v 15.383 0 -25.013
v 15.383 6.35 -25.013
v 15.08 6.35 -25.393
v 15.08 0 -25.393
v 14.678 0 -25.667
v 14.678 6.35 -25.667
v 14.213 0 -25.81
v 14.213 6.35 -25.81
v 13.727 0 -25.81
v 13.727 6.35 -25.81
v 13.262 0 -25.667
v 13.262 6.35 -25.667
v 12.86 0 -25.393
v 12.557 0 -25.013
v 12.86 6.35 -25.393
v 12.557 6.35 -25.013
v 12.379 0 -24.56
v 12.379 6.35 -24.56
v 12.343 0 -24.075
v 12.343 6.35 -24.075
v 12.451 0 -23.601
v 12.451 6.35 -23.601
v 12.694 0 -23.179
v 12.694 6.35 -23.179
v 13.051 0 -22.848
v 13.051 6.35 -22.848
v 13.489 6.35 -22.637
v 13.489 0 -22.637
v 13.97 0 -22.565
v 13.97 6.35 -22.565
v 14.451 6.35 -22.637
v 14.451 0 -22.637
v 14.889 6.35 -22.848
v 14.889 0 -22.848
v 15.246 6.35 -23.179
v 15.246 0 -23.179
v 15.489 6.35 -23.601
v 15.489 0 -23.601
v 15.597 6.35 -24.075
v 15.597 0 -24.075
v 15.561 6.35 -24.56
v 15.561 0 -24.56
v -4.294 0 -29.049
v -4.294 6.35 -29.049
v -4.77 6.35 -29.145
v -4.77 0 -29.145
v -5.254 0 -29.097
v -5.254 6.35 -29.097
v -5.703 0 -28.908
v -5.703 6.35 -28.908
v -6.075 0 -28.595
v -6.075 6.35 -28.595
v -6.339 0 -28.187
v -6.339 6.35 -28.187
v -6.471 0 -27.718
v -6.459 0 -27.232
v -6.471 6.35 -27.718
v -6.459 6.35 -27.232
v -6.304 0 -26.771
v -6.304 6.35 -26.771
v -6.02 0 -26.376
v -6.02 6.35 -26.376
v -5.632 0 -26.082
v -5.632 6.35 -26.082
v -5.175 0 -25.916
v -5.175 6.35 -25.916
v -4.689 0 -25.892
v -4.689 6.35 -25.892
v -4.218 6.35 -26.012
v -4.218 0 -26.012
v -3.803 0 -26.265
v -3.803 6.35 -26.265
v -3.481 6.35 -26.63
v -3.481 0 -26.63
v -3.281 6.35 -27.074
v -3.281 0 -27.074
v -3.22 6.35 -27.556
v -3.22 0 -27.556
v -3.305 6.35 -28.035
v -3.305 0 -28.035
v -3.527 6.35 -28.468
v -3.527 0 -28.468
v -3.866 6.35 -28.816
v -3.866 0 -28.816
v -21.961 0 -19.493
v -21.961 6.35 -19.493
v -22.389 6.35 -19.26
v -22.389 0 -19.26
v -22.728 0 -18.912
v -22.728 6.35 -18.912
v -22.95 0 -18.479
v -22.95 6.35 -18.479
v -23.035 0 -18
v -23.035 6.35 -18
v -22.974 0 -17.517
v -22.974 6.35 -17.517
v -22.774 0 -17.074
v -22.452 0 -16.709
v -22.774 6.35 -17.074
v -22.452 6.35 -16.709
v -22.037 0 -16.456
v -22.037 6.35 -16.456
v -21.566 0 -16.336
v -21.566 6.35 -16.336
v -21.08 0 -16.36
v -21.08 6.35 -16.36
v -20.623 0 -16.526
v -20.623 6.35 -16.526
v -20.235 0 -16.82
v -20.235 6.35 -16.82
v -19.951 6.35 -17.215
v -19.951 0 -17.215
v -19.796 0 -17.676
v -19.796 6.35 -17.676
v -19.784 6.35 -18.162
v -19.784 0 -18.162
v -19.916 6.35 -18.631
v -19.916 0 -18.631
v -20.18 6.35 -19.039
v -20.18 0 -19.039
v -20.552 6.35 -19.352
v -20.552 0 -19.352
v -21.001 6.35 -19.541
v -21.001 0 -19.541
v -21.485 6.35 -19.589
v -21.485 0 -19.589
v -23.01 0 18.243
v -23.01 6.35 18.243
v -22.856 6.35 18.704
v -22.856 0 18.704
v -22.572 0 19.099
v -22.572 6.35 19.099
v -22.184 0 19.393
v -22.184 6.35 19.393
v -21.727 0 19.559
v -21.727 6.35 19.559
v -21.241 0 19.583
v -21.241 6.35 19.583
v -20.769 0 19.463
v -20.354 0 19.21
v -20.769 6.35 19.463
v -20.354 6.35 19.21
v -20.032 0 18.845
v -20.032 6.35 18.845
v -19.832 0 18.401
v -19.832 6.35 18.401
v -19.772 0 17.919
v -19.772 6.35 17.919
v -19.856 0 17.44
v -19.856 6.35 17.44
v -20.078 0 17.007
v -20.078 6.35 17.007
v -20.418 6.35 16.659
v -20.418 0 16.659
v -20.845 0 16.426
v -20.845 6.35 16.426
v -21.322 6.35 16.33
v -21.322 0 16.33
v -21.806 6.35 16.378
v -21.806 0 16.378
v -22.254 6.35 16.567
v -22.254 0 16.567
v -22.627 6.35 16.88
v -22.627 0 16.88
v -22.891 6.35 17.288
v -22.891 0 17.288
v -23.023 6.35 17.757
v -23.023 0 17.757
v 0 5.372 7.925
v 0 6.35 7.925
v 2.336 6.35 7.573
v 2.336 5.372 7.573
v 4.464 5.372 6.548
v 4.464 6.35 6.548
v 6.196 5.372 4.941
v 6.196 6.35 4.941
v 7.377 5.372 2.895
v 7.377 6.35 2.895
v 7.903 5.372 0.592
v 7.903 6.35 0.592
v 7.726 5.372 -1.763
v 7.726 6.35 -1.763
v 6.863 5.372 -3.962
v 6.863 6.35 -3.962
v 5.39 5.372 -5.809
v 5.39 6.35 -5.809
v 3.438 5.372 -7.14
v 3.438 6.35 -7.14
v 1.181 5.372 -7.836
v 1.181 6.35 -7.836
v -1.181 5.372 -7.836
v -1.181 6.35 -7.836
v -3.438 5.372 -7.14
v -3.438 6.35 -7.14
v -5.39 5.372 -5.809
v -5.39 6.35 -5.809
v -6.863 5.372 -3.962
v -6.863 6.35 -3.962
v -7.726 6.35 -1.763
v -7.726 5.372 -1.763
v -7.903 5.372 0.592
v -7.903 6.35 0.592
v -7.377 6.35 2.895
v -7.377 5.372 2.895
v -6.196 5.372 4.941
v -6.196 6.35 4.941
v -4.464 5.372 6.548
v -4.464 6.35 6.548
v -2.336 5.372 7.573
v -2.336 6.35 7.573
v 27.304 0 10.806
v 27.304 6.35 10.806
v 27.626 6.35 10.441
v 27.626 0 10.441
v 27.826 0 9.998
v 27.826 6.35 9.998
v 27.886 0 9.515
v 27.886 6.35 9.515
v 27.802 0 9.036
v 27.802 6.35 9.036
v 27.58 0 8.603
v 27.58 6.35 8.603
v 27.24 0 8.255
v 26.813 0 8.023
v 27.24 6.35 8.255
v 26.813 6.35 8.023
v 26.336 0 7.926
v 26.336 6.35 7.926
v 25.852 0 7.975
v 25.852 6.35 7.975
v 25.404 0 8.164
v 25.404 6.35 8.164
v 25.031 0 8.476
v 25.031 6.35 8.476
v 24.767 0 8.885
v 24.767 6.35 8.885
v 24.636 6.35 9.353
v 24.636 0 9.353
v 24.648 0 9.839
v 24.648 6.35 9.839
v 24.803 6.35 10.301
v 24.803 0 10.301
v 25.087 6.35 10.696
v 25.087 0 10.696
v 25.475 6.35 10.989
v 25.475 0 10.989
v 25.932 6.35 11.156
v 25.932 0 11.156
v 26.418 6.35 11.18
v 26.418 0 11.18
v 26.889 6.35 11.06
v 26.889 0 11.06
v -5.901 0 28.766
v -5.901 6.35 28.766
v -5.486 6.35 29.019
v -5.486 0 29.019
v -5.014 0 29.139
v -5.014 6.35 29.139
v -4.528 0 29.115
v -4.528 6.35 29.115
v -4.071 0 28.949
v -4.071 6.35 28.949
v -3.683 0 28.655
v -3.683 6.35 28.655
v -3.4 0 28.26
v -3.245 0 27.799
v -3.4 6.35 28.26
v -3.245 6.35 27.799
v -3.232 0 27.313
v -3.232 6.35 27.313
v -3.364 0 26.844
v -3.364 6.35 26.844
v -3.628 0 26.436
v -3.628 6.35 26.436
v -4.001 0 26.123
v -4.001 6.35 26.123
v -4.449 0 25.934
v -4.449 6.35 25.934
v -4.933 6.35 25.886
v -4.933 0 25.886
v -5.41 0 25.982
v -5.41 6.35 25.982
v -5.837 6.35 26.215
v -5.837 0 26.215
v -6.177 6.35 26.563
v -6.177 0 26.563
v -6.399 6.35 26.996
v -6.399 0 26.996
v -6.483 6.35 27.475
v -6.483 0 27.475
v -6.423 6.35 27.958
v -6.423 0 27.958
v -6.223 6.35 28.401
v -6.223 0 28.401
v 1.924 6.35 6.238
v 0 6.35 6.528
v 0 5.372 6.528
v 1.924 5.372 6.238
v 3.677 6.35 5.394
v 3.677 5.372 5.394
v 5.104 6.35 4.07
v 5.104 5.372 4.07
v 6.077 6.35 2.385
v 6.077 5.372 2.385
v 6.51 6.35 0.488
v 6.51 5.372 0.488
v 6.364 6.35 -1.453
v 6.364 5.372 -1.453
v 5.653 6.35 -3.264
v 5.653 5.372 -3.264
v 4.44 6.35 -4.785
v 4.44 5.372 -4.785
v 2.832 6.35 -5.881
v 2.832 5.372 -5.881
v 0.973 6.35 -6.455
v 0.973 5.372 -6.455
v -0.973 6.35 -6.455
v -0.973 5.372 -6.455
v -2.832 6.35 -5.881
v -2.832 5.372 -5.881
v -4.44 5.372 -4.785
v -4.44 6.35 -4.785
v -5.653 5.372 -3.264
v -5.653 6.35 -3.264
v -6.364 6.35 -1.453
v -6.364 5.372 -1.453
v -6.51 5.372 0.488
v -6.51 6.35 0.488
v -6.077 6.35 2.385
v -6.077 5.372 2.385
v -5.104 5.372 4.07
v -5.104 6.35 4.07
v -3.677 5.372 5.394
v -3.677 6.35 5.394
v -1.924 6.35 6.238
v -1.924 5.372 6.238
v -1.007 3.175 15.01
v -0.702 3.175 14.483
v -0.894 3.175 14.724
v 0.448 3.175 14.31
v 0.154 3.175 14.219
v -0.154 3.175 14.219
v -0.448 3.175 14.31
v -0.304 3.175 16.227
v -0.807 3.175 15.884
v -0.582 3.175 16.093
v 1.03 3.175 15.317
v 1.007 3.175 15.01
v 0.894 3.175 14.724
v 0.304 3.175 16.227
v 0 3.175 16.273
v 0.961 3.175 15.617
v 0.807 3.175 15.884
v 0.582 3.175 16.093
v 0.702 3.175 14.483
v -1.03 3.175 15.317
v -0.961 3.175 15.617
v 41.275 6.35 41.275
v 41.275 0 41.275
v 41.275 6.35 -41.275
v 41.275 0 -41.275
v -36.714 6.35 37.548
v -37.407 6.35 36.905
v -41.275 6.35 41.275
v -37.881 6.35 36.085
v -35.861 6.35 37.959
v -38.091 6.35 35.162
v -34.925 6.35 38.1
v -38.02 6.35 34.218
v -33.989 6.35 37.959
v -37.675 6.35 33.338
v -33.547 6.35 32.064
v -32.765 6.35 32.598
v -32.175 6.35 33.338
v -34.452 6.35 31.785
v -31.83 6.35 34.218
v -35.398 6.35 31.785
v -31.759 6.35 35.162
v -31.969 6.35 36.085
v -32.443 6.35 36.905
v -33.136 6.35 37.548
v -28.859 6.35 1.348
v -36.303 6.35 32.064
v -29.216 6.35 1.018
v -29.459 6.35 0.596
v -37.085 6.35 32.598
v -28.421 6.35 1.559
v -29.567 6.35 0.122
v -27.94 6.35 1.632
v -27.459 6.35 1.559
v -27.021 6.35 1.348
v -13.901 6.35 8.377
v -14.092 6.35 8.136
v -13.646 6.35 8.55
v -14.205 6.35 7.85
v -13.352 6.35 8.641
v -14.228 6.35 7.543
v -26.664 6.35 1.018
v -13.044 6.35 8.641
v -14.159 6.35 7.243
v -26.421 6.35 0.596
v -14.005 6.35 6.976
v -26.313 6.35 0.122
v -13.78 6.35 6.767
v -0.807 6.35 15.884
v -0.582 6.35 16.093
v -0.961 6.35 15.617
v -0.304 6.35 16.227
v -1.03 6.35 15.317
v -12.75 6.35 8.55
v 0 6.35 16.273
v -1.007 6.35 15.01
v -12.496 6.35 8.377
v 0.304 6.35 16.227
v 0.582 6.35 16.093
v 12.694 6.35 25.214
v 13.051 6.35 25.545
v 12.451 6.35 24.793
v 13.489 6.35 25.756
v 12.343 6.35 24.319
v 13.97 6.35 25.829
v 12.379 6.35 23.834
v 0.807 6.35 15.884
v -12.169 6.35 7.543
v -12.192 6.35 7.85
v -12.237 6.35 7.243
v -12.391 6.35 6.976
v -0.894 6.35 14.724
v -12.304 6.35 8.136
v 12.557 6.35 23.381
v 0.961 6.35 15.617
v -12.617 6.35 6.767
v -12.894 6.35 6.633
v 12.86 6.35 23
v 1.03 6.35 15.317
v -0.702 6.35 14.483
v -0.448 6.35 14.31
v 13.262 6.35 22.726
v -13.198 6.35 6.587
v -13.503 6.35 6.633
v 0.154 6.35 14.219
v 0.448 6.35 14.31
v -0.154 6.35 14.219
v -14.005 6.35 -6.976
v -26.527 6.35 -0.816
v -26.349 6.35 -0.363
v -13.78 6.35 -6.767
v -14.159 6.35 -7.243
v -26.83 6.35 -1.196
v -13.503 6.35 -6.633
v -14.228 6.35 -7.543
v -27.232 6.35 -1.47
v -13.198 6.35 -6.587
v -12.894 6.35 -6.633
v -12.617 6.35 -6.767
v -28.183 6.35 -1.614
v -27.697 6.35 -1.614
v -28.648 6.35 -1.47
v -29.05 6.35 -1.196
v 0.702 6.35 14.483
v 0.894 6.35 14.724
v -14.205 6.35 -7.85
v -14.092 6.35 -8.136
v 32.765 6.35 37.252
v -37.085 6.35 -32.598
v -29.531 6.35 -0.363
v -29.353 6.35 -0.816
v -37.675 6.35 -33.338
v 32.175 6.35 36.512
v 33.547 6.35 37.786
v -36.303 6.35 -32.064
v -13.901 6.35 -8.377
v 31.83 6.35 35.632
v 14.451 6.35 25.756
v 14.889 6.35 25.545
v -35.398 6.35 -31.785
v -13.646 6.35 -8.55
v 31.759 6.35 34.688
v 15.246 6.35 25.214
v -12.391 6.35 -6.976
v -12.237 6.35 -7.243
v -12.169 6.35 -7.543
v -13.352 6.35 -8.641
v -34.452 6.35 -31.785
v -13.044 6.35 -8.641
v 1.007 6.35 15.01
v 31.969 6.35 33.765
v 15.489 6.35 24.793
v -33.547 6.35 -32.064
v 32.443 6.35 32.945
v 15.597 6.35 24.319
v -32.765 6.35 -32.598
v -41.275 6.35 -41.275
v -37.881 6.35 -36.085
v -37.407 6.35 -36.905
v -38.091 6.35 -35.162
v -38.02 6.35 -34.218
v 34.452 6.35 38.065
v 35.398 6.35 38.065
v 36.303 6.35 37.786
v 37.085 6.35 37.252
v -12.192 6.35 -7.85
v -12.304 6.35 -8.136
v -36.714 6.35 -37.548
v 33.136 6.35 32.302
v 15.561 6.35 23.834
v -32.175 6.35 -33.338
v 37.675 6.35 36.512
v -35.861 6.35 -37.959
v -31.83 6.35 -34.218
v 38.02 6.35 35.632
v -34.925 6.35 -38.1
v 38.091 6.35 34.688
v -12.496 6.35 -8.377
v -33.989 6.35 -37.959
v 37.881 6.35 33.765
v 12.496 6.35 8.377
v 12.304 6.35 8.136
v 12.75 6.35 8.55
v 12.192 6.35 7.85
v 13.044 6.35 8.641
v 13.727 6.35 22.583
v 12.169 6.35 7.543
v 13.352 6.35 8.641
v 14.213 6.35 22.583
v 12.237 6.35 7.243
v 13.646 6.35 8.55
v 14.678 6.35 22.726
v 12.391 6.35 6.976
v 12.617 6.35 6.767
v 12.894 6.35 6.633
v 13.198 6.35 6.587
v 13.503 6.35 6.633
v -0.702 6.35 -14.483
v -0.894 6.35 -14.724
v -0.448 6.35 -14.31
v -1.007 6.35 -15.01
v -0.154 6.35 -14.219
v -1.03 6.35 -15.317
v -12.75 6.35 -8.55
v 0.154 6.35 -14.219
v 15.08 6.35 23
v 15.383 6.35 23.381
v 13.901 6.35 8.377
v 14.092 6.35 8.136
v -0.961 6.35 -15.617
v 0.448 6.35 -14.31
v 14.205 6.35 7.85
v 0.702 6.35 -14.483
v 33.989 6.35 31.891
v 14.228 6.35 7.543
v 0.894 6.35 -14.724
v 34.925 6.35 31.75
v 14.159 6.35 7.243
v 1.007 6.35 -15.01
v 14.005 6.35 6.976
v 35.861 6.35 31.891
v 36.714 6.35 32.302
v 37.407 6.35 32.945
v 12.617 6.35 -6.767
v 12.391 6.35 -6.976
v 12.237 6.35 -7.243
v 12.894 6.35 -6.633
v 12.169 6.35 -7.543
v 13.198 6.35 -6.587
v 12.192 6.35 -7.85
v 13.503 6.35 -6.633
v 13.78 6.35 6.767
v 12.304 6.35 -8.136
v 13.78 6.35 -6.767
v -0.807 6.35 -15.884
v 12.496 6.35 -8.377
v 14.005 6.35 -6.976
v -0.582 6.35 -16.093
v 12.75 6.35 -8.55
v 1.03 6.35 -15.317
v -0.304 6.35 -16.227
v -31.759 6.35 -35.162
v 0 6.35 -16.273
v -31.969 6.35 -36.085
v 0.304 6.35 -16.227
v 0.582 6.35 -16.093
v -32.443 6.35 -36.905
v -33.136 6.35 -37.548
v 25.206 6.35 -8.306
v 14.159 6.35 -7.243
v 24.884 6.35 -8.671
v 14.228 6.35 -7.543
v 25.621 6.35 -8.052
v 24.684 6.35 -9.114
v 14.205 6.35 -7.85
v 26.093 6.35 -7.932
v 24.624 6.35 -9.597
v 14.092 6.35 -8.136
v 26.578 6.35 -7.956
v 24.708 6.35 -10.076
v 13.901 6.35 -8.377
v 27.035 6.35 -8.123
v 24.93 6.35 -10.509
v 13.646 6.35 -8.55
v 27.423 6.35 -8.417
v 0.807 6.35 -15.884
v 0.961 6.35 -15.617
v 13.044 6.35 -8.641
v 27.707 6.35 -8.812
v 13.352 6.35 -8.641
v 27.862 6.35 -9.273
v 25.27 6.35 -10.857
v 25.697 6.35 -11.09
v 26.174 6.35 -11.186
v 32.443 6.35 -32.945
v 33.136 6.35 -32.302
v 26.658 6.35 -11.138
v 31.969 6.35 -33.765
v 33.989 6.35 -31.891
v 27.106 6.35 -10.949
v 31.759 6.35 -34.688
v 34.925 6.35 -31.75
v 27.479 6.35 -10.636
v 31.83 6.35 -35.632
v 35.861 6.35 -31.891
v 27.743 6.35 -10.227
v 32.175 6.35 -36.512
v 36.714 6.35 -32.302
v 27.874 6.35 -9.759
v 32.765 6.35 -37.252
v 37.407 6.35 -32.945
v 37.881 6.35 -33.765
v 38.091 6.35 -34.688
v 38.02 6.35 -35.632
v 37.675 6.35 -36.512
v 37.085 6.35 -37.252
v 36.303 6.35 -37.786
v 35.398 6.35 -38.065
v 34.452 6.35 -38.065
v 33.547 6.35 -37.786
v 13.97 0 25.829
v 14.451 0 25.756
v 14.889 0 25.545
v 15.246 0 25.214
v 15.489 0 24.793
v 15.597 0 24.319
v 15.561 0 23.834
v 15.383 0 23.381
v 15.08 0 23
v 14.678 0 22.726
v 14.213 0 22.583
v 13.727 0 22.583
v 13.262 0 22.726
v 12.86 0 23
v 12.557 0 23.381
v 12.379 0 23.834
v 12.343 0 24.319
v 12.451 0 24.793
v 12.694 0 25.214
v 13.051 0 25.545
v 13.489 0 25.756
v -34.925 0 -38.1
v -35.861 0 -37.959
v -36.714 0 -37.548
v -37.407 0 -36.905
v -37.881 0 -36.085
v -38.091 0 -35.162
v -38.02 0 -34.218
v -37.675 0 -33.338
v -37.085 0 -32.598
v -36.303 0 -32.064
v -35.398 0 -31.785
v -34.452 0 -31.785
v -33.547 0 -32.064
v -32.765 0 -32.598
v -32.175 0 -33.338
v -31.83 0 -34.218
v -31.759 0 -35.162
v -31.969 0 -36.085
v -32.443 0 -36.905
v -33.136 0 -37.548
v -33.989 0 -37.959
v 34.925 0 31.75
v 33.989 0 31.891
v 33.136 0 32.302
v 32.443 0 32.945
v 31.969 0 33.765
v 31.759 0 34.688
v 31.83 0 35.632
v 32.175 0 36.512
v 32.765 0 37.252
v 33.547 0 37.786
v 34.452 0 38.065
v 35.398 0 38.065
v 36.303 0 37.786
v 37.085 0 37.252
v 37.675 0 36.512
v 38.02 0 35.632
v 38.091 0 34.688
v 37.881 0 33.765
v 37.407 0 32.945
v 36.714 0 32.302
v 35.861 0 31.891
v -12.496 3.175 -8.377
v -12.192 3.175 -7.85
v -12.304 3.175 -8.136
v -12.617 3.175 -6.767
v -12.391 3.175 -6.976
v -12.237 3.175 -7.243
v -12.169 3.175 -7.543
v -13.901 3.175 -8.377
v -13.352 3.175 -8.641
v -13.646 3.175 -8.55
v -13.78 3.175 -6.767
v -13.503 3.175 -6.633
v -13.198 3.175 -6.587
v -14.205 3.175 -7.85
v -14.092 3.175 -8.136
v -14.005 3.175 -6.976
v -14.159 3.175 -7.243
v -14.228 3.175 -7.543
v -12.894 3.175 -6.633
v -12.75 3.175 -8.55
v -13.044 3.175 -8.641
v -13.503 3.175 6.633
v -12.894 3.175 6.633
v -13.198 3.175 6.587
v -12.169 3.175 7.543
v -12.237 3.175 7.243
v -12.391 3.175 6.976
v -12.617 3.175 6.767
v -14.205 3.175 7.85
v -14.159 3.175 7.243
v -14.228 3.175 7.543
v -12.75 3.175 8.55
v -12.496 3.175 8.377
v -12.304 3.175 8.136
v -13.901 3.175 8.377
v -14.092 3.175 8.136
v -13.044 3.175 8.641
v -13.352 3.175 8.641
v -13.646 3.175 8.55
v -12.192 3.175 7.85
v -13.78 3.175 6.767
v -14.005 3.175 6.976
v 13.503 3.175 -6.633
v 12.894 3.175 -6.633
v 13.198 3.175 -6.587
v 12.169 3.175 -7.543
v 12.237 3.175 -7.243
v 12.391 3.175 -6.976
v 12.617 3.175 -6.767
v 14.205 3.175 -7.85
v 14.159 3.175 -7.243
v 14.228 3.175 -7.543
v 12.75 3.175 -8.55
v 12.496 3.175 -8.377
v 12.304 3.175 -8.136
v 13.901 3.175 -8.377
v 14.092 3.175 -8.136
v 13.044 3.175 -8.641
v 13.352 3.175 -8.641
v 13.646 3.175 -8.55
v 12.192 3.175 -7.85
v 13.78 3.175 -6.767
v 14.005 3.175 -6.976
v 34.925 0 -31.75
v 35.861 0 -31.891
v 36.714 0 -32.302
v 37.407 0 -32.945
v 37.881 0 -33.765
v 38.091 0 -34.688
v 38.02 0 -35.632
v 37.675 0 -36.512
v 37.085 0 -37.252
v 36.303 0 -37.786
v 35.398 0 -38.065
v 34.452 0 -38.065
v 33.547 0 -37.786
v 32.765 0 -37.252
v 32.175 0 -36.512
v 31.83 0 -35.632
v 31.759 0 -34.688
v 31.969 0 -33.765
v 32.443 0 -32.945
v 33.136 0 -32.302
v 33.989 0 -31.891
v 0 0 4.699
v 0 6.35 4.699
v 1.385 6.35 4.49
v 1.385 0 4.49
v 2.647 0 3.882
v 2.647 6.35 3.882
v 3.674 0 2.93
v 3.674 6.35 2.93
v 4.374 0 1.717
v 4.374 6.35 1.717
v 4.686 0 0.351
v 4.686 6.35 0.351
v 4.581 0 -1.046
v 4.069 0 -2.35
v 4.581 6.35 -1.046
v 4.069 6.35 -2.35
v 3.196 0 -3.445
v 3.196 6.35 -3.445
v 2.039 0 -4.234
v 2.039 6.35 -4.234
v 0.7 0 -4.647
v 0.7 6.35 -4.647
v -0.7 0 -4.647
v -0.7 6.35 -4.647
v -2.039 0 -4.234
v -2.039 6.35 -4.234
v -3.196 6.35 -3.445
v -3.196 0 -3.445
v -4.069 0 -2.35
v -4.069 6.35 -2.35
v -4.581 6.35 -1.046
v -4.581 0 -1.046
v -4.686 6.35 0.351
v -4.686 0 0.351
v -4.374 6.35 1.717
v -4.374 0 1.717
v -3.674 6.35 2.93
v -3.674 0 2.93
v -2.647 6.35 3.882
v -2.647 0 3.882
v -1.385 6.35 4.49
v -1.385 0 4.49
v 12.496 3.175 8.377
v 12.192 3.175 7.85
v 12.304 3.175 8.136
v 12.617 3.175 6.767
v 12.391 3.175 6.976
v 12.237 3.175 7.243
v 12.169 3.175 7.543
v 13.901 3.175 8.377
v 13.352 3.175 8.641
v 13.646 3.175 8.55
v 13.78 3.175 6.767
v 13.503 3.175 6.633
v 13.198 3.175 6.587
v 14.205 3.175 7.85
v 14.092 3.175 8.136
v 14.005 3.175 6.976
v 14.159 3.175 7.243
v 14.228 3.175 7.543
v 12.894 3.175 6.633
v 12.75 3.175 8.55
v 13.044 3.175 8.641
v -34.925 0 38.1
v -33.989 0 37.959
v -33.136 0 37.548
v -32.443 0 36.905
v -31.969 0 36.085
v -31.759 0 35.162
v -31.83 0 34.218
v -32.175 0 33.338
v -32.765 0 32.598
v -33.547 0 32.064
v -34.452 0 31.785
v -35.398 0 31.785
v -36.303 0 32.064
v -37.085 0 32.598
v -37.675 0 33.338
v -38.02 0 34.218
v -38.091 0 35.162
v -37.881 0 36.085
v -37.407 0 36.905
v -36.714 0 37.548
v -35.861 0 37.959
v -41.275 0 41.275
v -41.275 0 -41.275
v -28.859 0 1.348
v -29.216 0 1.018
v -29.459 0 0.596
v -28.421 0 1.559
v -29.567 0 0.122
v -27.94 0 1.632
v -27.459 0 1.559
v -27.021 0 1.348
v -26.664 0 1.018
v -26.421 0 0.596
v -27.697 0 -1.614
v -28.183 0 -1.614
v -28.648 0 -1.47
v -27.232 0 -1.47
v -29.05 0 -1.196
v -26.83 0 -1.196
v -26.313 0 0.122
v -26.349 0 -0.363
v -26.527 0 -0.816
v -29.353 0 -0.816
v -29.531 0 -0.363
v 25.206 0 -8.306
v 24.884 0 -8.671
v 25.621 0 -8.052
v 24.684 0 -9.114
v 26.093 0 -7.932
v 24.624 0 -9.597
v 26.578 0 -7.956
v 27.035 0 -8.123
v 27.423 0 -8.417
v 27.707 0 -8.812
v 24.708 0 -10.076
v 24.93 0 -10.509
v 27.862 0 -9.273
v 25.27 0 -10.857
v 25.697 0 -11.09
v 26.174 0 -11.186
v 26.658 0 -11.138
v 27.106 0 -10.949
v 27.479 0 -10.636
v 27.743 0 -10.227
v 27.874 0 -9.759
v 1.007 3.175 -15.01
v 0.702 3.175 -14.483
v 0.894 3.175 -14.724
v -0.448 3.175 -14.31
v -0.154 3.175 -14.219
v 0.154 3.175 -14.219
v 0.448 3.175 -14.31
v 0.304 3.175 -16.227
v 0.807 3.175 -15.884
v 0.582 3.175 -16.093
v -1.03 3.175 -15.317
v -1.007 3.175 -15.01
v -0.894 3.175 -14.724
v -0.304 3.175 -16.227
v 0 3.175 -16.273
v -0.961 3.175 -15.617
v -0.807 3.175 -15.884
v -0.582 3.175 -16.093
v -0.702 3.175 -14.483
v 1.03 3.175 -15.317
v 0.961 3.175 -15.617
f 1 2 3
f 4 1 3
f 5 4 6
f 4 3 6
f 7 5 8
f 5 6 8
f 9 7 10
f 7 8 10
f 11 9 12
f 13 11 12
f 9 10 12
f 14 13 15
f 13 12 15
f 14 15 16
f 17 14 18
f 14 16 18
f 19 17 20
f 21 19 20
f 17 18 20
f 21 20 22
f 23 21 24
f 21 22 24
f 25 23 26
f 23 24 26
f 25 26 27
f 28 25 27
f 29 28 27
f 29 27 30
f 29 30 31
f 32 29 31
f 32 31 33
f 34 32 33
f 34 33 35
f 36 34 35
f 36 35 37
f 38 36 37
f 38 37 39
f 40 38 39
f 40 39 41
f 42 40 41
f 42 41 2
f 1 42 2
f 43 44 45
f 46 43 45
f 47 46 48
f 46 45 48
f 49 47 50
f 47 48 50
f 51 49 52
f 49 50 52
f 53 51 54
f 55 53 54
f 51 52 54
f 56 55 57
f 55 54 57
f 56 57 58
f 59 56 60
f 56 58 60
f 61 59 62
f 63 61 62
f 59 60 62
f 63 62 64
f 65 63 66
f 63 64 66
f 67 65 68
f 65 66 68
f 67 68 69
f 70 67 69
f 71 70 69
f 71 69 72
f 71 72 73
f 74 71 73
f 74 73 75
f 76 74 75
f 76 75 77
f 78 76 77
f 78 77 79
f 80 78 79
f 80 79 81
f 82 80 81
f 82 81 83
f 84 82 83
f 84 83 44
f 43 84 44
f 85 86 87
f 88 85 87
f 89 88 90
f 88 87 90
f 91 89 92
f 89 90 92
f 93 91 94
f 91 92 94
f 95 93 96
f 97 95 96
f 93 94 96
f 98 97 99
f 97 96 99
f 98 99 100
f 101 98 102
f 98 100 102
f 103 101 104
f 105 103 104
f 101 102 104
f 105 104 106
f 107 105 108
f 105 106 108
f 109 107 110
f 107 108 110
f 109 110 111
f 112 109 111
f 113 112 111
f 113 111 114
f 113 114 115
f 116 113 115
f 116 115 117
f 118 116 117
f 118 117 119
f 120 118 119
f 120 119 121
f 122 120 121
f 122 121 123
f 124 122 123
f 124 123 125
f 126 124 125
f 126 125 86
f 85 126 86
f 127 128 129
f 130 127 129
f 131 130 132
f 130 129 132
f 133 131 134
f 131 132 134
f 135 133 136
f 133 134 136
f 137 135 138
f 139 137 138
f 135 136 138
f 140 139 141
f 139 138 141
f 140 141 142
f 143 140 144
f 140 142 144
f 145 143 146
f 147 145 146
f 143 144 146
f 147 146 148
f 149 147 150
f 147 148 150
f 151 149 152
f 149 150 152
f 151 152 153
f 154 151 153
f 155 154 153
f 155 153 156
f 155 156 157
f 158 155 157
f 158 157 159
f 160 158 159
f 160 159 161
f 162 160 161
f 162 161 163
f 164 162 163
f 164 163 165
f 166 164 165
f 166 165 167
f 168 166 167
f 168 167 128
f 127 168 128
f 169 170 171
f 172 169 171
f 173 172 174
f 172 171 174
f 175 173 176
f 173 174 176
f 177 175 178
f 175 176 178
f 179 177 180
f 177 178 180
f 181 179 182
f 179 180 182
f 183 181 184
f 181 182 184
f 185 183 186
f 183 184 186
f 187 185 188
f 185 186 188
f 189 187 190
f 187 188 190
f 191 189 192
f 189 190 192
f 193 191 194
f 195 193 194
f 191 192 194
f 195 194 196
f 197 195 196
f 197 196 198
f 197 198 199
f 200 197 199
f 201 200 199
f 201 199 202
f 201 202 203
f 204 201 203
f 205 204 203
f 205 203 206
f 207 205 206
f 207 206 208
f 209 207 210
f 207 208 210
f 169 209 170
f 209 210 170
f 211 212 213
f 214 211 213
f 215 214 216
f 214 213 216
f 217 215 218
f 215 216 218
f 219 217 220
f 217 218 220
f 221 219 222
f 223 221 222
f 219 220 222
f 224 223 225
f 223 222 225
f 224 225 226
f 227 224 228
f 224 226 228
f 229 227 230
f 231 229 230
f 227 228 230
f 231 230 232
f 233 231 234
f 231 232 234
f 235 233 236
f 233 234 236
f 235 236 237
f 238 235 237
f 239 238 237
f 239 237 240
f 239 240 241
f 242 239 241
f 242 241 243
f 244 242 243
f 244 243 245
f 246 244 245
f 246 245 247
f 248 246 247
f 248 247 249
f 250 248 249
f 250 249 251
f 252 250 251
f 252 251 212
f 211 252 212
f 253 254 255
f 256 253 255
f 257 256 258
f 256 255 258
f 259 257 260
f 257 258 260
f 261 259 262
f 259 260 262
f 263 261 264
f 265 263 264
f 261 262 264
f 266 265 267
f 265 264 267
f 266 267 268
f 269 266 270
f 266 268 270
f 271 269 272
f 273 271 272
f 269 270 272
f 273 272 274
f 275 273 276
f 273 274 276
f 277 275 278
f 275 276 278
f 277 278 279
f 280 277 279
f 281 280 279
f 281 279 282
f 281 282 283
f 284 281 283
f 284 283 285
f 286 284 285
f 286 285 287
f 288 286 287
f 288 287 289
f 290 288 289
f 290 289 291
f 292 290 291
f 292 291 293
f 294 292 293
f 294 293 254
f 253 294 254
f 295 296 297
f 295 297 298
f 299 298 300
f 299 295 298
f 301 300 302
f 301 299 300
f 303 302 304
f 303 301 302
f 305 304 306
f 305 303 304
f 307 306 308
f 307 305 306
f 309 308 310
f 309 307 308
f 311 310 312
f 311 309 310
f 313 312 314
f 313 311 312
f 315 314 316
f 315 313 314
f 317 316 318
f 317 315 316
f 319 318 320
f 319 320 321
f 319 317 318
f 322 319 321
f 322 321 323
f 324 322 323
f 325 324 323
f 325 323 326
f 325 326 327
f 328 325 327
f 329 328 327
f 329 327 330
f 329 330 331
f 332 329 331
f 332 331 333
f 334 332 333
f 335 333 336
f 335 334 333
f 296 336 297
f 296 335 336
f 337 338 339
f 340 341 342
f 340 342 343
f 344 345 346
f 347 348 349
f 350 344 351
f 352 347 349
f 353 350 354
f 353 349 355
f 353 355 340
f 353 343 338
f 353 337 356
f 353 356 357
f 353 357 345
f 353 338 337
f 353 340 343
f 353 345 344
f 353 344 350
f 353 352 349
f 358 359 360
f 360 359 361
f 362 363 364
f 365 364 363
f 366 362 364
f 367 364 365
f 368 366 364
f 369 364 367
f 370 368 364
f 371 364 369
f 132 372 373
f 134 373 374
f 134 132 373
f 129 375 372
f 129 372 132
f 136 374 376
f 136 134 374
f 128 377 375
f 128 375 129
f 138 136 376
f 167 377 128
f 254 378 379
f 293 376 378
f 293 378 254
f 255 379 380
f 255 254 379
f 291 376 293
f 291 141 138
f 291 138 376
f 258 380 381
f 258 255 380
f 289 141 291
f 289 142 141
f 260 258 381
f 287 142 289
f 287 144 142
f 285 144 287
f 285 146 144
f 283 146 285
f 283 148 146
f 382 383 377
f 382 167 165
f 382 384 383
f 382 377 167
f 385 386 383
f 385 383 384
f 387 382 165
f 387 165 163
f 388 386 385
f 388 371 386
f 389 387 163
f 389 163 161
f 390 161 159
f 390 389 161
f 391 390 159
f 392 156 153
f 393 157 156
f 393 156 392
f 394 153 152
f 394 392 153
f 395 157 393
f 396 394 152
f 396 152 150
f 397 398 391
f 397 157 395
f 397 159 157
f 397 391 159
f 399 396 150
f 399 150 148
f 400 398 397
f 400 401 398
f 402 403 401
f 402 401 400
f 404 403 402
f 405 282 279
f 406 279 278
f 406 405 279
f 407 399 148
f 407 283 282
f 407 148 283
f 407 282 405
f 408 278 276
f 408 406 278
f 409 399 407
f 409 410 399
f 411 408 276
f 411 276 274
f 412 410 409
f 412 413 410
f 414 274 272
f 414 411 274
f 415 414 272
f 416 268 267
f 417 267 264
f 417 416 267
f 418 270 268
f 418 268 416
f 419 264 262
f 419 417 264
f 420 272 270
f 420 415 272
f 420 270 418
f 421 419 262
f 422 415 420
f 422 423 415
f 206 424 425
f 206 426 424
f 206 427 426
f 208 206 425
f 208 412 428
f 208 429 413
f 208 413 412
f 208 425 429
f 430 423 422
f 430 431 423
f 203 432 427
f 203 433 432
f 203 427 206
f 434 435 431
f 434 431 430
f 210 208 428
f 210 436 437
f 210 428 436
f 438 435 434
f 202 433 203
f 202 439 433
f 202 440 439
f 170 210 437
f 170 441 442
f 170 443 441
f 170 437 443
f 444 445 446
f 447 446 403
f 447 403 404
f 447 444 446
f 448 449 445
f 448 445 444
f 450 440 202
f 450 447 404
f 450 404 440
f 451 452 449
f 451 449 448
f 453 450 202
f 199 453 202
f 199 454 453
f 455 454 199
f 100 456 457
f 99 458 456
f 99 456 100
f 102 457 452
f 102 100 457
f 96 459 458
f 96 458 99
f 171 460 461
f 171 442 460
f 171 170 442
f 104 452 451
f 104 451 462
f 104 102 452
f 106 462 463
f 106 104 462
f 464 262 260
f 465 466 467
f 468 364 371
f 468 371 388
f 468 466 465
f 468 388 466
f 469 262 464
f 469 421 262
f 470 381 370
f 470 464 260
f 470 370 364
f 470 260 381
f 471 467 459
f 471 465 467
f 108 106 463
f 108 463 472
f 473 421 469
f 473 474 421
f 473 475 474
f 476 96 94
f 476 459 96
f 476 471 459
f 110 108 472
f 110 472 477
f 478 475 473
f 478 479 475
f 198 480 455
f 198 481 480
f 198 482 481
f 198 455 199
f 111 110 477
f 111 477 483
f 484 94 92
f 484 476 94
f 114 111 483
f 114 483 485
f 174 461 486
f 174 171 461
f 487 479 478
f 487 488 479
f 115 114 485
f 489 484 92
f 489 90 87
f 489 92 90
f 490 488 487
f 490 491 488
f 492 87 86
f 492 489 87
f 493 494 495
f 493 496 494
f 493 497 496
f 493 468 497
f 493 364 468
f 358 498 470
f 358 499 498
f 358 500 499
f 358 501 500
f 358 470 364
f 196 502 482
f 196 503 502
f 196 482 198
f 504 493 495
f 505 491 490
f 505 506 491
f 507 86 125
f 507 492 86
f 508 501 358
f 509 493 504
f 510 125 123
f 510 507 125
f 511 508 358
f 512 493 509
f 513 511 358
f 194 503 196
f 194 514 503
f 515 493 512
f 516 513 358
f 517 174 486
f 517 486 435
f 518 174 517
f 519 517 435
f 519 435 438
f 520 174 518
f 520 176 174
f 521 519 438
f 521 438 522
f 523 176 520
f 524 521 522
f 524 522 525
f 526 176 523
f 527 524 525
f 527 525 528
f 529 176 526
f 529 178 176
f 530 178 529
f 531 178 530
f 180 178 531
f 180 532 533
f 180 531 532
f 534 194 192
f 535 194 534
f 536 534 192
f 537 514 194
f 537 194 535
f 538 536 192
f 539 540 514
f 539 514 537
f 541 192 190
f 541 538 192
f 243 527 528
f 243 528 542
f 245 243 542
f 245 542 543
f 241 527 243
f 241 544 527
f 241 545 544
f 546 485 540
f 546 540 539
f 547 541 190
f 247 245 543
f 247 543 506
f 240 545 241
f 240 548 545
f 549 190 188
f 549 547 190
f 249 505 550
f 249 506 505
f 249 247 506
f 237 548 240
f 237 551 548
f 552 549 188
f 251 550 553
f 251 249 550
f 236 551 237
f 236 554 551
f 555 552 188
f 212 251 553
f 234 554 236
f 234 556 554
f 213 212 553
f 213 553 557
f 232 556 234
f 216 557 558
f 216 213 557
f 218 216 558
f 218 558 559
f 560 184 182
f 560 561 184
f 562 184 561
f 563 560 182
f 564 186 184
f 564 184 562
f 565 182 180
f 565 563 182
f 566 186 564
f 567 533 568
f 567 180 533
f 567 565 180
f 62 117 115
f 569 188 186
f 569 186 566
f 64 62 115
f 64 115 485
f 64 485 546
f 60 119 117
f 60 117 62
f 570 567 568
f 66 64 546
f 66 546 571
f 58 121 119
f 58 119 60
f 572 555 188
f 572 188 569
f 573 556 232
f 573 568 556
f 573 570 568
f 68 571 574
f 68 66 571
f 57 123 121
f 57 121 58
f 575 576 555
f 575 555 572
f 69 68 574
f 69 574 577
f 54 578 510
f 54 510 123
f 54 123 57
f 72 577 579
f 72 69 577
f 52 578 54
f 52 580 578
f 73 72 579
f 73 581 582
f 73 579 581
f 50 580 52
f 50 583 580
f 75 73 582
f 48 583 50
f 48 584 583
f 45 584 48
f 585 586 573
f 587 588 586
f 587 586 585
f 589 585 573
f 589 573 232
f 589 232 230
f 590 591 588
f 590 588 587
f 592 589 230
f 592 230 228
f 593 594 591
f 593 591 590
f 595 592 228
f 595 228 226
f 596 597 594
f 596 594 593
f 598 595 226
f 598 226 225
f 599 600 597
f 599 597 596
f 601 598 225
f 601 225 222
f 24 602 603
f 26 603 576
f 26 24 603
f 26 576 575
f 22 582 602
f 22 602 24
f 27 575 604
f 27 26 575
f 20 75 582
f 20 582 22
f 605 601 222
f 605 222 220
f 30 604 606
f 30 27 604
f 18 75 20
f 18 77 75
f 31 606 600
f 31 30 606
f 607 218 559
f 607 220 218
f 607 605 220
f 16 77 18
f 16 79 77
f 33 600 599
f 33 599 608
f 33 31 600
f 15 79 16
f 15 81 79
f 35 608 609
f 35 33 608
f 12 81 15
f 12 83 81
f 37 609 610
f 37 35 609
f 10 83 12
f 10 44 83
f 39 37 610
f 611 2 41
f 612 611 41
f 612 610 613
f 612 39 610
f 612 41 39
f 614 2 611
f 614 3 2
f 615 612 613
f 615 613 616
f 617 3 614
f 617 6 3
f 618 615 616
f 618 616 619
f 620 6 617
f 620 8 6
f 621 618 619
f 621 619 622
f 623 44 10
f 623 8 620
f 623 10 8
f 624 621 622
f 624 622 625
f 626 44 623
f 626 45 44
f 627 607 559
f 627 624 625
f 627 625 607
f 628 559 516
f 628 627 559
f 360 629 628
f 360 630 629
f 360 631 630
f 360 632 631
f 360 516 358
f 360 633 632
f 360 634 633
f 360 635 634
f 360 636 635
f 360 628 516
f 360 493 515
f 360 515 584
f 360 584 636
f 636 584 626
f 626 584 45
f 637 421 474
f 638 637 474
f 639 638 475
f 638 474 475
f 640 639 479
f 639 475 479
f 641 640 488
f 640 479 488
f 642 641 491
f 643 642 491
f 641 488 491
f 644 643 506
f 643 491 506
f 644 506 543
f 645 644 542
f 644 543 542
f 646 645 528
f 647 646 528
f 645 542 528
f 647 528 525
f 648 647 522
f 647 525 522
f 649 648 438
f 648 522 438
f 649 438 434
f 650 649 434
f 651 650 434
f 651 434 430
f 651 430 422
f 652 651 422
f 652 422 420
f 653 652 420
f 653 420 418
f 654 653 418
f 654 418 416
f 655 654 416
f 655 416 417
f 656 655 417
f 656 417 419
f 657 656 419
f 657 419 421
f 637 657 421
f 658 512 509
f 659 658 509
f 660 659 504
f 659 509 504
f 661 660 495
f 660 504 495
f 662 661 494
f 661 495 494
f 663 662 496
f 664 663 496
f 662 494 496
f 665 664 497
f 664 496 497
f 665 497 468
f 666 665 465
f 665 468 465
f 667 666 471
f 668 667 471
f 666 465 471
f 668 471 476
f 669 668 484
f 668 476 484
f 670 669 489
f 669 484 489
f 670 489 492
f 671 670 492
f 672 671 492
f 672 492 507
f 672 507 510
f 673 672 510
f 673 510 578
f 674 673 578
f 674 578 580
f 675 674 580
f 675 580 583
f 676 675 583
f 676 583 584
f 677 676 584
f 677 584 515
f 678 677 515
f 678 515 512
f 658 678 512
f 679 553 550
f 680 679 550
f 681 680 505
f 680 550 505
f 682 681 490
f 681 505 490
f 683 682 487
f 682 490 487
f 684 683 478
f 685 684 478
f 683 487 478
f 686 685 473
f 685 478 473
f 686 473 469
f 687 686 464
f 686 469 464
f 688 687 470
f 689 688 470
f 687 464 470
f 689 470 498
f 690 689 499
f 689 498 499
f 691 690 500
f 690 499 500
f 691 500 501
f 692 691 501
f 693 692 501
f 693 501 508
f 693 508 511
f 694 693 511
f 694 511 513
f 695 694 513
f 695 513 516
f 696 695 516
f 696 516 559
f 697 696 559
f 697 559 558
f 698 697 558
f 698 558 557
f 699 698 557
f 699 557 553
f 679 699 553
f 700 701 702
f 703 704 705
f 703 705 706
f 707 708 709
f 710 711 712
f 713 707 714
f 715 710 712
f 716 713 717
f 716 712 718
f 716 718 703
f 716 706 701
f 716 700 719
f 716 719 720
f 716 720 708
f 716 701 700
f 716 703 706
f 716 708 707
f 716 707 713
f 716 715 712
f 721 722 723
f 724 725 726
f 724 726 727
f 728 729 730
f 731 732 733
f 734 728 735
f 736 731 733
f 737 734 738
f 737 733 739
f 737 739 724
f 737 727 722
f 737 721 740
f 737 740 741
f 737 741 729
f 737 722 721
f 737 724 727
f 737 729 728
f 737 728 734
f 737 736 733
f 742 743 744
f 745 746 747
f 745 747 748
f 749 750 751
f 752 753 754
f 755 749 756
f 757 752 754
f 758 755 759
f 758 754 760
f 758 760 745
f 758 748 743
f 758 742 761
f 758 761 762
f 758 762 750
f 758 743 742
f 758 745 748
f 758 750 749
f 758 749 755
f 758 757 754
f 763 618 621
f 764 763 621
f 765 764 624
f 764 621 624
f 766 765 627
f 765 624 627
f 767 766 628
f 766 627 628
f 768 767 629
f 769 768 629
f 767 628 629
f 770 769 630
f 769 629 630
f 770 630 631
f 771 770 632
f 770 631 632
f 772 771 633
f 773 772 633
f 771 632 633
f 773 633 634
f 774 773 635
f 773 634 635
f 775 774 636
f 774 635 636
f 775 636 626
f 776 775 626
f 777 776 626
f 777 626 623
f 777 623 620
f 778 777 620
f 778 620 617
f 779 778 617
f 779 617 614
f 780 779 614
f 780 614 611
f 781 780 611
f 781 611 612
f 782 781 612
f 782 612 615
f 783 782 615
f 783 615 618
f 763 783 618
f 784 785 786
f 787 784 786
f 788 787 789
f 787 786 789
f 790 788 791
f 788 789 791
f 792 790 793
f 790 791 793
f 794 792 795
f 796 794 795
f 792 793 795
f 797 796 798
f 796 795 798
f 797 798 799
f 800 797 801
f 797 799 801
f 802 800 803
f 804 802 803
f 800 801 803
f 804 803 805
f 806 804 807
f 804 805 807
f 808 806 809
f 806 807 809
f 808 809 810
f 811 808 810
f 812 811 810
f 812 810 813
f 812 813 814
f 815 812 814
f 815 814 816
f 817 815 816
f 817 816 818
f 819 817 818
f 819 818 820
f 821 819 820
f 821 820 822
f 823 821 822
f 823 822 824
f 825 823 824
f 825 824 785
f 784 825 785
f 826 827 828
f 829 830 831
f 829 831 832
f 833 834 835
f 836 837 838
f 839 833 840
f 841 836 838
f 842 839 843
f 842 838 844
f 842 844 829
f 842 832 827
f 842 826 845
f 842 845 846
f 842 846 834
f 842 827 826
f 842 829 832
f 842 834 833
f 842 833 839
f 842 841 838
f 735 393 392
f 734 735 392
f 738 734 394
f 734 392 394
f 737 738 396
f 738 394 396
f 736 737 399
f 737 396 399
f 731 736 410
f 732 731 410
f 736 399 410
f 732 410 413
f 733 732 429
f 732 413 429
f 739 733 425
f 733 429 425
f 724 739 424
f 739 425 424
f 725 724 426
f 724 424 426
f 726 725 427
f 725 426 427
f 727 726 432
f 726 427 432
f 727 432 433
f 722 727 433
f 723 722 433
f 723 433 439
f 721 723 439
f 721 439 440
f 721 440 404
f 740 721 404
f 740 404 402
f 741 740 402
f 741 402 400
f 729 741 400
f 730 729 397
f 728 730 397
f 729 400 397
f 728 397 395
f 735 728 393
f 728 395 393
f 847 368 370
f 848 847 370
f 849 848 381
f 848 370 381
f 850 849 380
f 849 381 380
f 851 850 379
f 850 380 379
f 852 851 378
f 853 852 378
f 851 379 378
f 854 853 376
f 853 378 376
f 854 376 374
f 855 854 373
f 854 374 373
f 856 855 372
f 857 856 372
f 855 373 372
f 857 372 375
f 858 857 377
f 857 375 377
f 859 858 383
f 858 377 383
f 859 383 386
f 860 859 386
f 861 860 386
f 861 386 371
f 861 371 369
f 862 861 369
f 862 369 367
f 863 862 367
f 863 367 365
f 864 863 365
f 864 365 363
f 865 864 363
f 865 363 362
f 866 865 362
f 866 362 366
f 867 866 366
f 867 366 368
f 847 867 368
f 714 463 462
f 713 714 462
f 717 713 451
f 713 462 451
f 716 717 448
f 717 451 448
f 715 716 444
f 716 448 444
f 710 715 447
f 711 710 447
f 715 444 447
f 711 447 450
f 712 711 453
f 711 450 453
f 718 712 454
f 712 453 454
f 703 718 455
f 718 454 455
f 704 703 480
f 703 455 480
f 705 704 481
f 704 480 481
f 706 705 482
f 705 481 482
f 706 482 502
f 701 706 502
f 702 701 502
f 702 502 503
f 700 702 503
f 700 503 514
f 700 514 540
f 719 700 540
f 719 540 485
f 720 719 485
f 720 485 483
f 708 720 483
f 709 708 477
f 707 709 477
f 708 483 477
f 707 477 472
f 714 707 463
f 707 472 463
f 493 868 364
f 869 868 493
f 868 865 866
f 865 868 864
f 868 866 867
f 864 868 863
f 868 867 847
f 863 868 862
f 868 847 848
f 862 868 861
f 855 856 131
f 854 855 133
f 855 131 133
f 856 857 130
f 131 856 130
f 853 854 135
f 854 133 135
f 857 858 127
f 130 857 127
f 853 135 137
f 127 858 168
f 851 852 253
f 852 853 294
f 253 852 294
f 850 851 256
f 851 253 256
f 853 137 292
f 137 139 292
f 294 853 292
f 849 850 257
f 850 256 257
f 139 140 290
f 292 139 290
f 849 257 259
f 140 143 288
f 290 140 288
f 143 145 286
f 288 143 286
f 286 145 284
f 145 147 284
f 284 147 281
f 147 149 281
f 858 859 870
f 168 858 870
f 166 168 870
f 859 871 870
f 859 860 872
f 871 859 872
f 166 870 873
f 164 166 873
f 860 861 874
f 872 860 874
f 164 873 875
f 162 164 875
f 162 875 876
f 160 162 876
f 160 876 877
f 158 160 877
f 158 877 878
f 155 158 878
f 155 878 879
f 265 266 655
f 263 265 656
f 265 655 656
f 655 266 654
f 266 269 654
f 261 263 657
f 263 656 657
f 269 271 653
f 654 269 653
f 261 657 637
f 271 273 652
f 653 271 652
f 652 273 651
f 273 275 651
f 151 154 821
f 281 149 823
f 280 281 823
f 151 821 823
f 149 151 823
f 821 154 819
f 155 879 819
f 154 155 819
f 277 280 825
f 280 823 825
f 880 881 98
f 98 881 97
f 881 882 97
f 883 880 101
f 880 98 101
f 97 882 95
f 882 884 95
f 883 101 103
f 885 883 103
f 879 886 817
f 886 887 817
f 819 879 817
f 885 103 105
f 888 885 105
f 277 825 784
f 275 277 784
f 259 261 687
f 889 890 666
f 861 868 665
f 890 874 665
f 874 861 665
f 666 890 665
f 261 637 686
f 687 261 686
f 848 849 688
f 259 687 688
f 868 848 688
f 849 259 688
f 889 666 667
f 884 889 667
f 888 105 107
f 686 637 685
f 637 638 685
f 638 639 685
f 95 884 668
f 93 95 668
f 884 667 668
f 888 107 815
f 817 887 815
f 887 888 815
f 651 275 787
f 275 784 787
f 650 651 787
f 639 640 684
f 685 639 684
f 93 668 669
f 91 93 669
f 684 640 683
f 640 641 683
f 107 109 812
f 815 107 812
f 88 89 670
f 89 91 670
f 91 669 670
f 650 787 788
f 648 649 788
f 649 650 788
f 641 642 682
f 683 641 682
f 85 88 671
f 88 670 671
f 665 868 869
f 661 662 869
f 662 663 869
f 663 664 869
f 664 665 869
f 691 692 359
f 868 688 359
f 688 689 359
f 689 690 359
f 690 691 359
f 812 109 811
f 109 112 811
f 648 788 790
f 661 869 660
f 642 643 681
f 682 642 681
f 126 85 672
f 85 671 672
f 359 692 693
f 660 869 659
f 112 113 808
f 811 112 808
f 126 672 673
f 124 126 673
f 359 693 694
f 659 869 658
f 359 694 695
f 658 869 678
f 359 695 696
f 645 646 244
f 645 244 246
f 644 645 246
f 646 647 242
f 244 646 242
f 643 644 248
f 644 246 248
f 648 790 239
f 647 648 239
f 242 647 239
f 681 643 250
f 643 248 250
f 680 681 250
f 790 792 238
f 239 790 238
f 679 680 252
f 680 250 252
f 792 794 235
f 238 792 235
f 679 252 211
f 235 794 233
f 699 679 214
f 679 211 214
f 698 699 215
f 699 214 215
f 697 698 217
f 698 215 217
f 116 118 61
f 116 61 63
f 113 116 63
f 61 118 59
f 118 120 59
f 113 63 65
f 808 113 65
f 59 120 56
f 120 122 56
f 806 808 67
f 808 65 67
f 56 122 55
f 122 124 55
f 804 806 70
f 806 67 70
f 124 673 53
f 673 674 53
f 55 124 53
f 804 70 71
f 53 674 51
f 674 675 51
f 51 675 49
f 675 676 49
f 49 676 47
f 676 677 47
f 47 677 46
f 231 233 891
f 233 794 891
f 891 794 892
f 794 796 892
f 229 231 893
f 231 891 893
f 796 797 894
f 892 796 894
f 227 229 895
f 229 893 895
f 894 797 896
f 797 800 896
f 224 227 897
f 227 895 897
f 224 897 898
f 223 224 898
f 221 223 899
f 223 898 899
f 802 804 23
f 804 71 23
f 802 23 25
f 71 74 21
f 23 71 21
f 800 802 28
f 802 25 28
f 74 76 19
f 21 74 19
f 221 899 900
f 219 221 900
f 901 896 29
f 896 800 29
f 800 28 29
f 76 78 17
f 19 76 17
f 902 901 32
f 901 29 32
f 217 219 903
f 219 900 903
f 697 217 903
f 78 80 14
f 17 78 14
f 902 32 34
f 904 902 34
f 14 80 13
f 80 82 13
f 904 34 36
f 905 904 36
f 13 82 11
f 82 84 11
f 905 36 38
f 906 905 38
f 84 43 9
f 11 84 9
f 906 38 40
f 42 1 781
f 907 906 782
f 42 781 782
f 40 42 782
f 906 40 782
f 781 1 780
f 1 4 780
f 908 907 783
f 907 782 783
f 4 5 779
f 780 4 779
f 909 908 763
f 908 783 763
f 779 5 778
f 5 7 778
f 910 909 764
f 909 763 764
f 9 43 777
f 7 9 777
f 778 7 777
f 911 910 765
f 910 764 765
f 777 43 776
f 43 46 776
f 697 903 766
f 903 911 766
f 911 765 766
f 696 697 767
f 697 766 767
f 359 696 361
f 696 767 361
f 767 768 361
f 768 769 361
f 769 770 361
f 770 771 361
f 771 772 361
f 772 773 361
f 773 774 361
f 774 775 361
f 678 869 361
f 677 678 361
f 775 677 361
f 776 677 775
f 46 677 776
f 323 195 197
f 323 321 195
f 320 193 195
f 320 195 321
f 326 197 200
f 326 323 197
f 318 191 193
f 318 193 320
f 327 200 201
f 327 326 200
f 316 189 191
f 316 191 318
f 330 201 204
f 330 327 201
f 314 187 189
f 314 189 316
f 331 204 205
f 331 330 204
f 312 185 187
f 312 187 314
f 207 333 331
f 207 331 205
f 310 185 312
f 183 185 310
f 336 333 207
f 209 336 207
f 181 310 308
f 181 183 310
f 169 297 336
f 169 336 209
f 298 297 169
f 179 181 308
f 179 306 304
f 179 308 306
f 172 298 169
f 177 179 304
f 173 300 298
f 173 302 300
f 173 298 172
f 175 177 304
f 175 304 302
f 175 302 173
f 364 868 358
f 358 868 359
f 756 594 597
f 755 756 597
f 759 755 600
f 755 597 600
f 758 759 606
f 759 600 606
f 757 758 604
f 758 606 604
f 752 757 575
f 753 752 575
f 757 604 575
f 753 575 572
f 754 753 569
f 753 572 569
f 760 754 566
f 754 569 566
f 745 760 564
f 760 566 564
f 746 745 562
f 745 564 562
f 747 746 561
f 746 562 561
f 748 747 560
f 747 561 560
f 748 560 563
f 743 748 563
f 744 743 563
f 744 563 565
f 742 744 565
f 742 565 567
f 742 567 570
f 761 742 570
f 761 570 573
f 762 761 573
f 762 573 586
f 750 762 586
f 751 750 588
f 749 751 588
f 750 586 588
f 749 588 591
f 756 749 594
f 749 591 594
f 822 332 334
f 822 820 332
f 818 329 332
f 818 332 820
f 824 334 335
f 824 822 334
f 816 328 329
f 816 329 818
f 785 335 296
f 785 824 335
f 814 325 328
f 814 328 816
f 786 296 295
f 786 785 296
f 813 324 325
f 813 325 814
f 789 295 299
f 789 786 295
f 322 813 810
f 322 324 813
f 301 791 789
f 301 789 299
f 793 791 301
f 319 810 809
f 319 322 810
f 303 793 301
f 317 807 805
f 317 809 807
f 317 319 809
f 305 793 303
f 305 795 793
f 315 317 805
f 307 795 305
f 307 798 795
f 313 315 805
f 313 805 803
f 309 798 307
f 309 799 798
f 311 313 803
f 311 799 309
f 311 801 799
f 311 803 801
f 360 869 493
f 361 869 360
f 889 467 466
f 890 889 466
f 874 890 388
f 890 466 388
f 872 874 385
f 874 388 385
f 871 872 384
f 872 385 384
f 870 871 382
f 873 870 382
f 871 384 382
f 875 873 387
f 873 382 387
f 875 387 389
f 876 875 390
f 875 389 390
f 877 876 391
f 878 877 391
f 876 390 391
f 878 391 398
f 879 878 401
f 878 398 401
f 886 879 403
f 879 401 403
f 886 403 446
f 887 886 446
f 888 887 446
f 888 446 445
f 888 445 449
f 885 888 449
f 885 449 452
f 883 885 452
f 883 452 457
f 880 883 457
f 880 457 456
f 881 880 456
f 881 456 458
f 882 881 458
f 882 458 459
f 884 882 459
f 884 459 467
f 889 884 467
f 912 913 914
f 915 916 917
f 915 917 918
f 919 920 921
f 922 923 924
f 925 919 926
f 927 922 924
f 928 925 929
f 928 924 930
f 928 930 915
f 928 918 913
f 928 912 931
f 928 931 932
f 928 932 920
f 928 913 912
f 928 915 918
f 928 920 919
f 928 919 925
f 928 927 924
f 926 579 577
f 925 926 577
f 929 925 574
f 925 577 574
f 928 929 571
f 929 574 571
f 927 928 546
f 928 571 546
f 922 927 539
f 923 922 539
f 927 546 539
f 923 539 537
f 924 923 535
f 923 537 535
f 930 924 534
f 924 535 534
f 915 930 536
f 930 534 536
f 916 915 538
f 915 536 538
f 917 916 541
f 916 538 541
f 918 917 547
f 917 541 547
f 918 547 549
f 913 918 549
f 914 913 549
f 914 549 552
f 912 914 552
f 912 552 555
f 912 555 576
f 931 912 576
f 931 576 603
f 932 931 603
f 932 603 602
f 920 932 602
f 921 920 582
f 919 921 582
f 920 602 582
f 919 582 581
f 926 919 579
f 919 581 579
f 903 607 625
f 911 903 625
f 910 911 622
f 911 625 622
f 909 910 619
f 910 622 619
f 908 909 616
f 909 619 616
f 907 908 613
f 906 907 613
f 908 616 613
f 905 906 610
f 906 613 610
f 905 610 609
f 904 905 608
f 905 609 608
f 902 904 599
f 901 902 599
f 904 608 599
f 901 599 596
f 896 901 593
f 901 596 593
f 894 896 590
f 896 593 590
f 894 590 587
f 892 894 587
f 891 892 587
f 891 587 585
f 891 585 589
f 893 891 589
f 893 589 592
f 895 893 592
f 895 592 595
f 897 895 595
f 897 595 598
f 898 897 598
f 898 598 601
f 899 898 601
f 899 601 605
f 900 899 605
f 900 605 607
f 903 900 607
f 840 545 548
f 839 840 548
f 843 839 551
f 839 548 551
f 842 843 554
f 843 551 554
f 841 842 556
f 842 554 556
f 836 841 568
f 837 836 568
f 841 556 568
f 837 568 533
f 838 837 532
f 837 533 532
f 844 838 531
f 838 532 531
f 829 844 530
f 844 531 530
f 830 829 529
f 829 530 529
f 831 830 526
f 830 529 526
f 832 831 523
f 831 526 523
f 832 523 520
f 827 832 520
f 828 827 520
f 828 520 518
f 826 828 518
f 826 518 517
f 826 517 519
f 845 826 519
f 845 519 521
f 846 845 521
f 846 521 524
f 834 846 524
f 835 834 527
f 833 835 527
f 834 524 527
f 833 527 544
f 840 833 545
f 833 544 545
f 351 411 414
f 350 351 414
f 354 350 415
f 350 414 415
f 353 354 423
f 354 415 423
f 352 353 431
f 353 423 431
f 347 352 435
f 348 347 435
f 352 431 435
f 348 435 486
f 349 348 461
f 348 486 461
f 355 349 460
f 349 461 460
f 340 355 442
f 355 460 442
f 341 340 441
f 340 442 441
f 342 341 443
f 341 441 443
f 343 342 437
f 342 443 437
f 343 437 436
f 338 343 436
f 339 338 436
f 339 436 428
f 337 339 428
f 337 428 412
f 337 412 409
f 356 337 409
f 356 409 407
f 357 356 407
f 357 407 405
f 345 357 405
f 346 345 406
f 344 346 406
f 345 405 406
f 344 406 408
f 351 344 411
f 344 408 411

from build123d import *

# Parameters (mm, degrees)
SKETCH1_W           = 82.55
SKETCH1_H           = 82.55
BOSS_EXTRUDE1_DEPTH = 6.35
CUT_EXTRUDE1_REACH  = 60.716
SKETCH2_R           = 4.699
SKETCH4_R           = 7.9248
SKETCH4_R_2         = 6.5278
CUT_EXTRUDE3_DEPTH  = 0.9779
SKETCH5_R           = 1.03251
CUT_EXTRUDE4_DEPTH  = 3.175
CIRPATTERN1_COUNT   = 6
CUT_EXTRUDE5_REACH  = 60.716
SKETCH6_R           = 1.63195
CIRPATTERN2_COUNT   = 9
CUT_EXTRUDE6_REACH  = 60.716
SKETCH7_R           = 3.175


with BuildPart() as part:
    # Sketch1 → Boss-Extrude1 (new body)
    with BuildSketch(Plane(origin=(0, 0, 0), x_dir=(1, 0, 0), z_dir=(0, 1, 0))):
        Rectangle(SKETCH1_W, SKETCH1_H)
    extrude(amount=BOSS_EXTRUDE1_DEPTH)

    # Sketch2 → Cut-Extrude1 (cut, up to next)
    with BuildSketch(Plane(origin=(0, 6.35, 0), x_dir=(1, 0, 0), z_dir=(0, 1, 0)), mode=Mode.PRIVATE) as cut_extrude1_sk1:
        with Locations(Location((0, 0, 0), (0, 0, 270))):
            Circle(SKETCH2_R)
    cut_extrude1_tool1 = extrude(cut_extrude1_sk1.sketch, amount=-CUT_EXTRUDE1_REACH, mode=Mode.PRIVATE) & part.part
    add(cut_extrude1_tool1.solids().sort_by_distance((0, 6.35, 0))[0], mode=Mode.SUBTRACT)

    # Sketch4 → Cut-Extrude3 (cut)
    with BuildSketch(Plane(origin=(0, 6.35, 0), x_dir=(1, 0, 0), z_dir=(0, 1, 0))):
        with Locations(Location((0, 0, 0), (0, 0, 270))):
            Circle(SKETCH4_R)
        with Locations(Location((0, 0, 0), (0, 0, 270))):
            Circle(SKETCH4_R_2, mode=Mode.SUBTRACT)
    extrude(amount=-CUT_EXTRUDE3_DEPTH, mode=Mode.SUBTRACT)

    # Sketch5 → Cut-Extrude4 (cut)
    with BuildSketch(Plane(origin=(0, 6.35, 0), x_dir=(1, 0, 0), z_dir=(0, 1, 0))):
        with Locations(Location((0, -15.24, 0), (0, 0, 270))):
            Circle(SKETCH5_R)
    cut_extrude4 = extrude(amount=-CUT_EXTRUDE4_DEPTH, mode=Mode.SUBTRACT)

    # CirPattern1: Cut-Extrude4 ×6 about axis
    cirpattern1_axis = Axis((0, 0, 0), (0, 1, 0))
    for i in range(1, CIRPATTERN1_COUNT):
        add(cut_extrude4.rotate(cirpattern1_axis, i * 360 / CIRPATTERN1_COUNT), mode=Mode.SUBTRACT)

    # Sketch6 → Cut-Extrude5 (cut, up to next)
    with BuildSketch(Plane(origin=(0, 6.35, 0), x_dir=(1, 0, 0), z_dir=(0, 1, 0)), mode=Mode.PRIVATE) as cut_extrude5_sk1:
        with Locations(Location((13.97, -24.196749782, 0), (0, 0, 270))):
            Circle(SKETCH6_R)
    cut_extrude5_tool1 = extrude(cut_extrude5_sk1.sketch, amount=-CUT_EXTRUDE5_REACH, mode=Mode.PRIVATE) & part.part
    cut_extrude5 = cut_extrude5_tool1.solids().sort_by_distance((13.97, 6.35, 24.19675))[0]
    add(cut_extrude5, mode=Mode.SUBTRACT)

    # CirPattern2: Cut-Extrude5 ×9 about axis
    cirpattern2_axis = Axis((0, 0, 0), (0, 1, 0))
    for i in range(1, CIRPATTERN2_COUNT):
        add(cut_extrude5.rotate(cirpattern2_axis, i * 360 / CIRPATTERN2_COUNT), mode=Mode.SUBTRACT)

    # Sketch7 → Cut-Extrude6 (cut, up to next)
    with BuildSketch(Plane(origin=(0, 6.35, 0), x_dir=(1, 0, 0), z_dir=(0, 1, 0)), mode=Mode.PRIVATE) as cut_extrude6_sk1:
        with Locations(Location((34.925, 34.925, 0), (0, 0, 270))):
            Circle(SKETCH7_R)
    cut_extrude6_tool1 = extrude(cut_extrude6_sk1.sketch, amount=-CUT_EXTRUDE6_REACH, mode=Mode.PRIVATE) & part.part
    # Sketch7 → Cut-Extrude6 (cut, up to next)
    with BuildSketch(Plane(origin=(0, 6.35, 0), x_dir=(1, 0, 0), z_dir=(0, 1, 0)), mode=Mode.PRIVATE) as cut_extrude6_sk2:
        with Locations(Location((34.925, -34.925, 0), (0, 0, 90))):
            Circle(SKETCH7_R)
    cut_extrude6_tool2 = extrude(cut_extrude6_sk2.sketch, amount=-CUT_EXTRUDE6_REACH, mode=Mode.PRIVATE) & part.part
    # Sketch7 → Cut-Extrude6 (cut, up to next)
    with BuildSketch(Plane(origin=(0, 6.35, 0), x_dir=(1, 0, 0), z_dir=(0, 1, 0)), mode=Mode.PRIVATE) as cut_extrude6_sk3:
        with Locations(Location((-34.925, -34.925, 0), (0, 0, 270))):
            Circle(SKETCH7_R)
    cut_extrude6_tool3 = extrude(cut_extrude6_sk3.sketch, amount=-CUT_EXTRUDE6_REACH, mode=Mode.PRIVATE) & part.part
    # Sketch7 → Cut-Extrude6 (cut, up to next)
    with BuildSketch(Plane(origin=(0, 6.35, 0), x_dir=(1, 0, 0), z_dir=(0, 1, 0)), mode=Mode.PRIVATE) as cut_extrude6_sk4:
        with Locations(Location((-34.925, 34.925, 0), (0, 0, 90))):
            Circle(SKETCH7_R)
    cut_extrude6_tool4 = extrude(cut_extrude6_sk4.sketch, amount=-CUT_EXTRUDE6_REACH, mode=Mode.PRIVATE) & part.part
    add(cut_extrude6_tool1.solids().sort_by_distance((34.925, 6.35, -34.925))[0], mode=Mode.SUBTRACT)
    add(cut_extrude6_tool2.solids().sort_by_distance((34.925, 6.35, 34.925))[0], mode=Mode.SUBTRACT)
    add(cut_extrude6_tool3.solids().sort_by_distance((-34.925, 6.35, 34.925))[0], mode=Mode.SUBTRACT)
    add(cut_extrude6_tool4.solids().sort_by_distance((-34.925, 6.35, -34.925))[0], mode=Mode.SUBTRACT)


solid = part.part
